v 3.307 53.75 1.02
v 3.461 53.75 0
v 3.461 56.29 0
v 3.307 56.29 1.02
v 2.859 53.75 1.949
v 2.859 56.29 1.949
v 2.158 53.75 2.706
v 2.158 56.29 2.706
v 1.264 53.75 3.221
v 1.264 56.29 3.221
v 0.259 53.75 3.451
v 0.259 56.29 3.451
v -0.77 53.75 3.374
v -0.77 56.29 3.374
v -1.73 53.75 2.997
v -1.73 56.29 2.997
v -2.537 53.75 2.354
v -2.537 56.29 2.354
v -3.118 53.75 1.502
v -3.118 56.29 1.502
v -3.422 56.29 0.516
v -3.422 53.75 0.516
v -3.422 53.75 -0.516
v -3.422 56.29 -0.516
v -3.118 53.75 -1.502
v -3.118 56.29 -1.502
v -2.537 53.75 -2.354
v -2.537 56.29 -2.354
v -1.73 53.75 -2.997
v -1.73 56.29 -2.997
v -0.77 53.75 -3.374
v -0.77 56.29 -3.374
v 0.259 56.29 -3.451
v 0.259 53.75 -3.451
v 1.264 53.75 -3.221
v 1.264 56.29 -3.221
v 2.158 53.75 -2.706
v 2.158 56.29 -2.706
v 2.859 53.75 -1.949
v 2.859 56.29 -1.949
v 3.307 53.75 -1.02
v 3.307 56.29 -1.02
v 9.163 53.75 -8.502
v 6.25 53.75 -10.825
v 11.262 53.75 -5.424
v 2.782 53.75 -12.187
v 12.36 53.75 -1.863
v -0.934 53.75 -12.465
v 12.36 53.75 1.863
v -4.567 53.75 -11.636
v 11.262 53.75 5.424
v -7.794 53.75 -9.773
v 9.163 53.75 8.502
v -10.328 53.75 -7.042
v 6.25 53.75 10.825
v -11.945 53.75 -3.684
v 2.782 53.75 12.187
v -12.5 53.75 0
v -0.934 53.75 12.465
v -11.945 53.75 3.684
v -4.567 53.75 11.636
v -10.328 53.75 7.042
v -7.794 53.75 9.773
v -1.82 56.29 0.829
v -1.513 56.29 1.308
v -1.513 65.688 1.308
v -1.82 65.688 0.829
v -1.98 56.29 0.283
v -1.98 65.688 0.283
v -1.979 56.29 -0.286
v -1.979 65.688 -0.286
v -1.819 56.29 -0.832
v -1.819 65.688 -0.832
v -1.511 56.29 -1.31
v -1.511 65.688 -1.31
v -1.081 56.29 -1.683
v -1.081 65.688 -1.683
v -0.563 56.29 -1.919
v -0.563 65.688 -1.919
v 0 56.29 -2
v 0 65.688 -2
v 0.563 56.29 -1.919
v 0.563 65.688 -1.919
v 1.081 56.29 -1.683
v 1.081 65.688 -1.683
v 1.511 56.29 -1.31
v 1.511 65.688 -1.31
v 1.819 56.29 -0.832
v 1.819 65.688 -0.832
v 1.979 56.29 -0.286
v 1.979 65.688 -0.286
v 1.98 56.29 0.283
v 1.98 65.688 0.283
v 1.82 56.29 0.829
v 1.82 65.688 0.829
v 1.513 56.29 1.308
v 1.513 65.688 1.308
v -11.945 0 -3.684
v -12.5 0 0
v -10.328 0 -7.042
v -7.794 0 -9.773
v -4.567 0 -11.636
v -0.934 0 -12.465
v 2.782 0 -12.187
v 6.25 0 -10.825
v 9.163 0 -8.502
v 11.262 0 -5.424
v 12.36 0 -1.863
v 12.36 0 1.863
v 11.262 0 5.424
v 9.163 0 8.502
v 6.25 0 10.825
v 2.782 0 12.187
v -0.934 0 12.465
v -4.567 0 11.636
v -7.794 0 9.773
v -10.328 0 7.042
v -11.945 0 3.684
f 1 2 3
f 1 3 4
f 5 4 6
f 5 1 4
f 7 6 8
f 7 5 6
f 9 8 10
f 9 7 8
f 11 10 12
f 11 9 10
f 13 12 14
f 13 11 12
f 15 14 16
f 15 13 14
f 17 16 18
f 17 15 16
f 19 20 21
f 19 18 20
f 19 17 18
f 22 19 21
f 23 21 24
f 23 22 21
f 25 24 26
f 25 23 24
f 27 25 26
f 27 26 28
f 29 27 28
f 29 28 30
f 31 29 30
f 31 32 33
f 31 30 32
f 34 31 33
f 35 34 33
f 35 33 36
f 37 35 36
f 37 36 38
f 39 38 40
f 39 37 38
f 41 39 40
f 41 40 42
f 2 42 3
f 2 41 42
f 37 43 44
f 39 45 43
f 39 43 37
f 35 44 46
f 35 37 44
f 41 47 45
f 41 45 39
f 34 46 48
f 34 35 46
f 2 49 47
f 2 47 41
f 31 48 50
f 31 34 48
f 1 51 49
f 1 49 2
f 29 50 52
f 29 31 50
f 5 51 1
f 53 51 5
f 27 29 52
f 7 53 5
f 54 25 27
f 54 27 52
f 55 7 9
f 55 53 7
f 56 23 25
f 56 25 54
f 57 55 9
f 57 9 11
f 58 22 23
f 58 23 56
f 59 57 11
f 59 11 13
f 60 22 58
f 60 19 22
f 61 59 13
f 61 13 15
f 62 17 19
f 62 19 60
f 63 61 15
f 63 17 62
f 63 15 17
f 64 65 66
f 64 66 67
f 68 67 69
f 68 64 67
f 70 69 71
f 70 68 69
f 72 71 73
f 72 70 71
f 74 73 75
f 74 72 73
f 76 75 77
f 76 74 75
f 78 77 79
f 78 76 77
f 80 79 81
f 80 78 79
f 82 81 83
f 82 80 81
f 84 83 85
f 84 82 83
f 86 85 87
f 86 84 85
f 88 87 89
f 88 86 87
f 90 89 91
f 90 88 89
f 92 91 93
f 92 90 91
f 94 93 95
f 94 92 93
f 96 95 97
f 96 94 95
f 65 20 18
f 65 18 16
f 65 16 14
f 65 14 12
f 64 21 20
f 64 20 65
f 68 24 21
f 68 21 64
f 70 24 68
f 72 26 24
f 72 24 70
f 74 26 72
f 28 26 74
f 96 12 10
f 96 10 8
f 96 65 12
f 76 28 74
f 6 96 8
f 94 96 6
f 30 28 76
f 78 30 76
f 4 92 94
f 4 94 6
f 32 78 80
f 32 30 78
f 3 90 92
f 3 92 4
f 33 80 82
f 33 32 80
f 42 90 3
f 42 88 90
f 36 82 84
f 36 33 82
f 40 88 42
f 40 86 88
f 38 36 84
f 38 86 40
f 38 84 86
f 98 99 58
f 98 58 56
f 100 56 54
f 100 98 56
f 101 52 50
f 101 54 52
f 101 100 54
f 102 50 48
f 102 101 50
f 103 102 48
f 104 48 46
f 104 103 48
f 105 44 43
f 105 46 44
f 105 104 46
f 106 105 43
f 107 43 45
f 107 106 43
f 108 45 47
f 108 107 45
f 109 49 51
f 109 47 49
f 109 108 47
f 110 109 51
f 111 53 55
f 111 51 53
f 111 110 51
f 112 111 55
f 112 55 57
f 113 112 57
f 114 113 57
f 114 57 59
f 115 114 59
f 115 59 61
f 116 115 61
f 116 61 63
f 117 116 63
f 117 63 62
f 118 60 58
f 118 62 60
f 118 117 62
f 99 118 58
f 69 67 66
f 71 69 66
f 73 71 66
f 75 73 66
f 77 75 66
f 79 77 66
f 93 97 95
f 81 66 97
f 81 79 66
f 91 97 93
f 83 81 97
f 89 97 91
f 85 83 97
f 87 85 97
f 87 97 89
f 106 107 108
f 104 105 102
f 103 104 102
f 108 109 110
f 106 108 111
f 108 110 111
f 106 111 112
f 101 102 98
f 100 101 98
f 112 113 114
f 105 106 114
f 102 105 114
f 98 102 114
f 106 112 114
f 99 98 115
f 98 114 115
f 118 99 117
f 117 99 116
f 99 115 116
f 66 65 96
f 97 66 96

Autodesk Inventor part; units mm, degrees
ref_plane "YZ Plane" through (0, 0, 0) normal (1, 0, 0) x (0, 1, 0)
ref_plane "XZ Plane" through (0, 0, 0) normal (0, 1, 0) x (-1, 0, 0)
ref_plane "XY Plane" through (0, 0, 0) normal (0, 0, 1) x (1, 0, 0)
sketch "Sketch1" plane through (0, 0, 0) normal (0, 1, 0) x (-1, 0, 0)
  circle A0 centre (0, 0) radius 12.5
  dimension "d0" = 25
extrude "Extrusion1" add sketch "Sketch1" along normal blind 53.75
sketch "Sketch2" plane through (0, 53.75, 0) normal (0, 1, 0) x (1, 0, 0)
  circle A0 centre (0, 0) radius 2
  dimension "d3" = 4
extrude "Extrusion2" add sketch "Sketch2" along normal blind 11.938
sketch "Sketch3" plane through (0, 65.688, 0) normal (0, 1, 0) x (1, 0, 0)
  line L0 (-1.5129, -1.3081) -> (1.5129, -1.3081)
  circle A0 centre (0, 0) radius 2 projected
  arc A1 (-1.5129, -1.3081) -> (1.5129, -1.3081) centre (0, 0) ccw
  dimension "d12" = 1.3081
extrude "Extrusion3" cut sketch "Sketch3" against normal up to surface (11.938 mm away) contours L0 A0 picked at (-0.3834, -1.4174)
sketch "Sketch4" plane through (0, 53.75, 0) normal (0, 1, 0) x (1, 0, 0)
  circle A0 centre (0, 0) radius 3.4607
  dimension "d9" = 6.9215
extrude "Extrusion4" add sketch "Sketch4" along normal blind 2.54
properties part number "Motor"
